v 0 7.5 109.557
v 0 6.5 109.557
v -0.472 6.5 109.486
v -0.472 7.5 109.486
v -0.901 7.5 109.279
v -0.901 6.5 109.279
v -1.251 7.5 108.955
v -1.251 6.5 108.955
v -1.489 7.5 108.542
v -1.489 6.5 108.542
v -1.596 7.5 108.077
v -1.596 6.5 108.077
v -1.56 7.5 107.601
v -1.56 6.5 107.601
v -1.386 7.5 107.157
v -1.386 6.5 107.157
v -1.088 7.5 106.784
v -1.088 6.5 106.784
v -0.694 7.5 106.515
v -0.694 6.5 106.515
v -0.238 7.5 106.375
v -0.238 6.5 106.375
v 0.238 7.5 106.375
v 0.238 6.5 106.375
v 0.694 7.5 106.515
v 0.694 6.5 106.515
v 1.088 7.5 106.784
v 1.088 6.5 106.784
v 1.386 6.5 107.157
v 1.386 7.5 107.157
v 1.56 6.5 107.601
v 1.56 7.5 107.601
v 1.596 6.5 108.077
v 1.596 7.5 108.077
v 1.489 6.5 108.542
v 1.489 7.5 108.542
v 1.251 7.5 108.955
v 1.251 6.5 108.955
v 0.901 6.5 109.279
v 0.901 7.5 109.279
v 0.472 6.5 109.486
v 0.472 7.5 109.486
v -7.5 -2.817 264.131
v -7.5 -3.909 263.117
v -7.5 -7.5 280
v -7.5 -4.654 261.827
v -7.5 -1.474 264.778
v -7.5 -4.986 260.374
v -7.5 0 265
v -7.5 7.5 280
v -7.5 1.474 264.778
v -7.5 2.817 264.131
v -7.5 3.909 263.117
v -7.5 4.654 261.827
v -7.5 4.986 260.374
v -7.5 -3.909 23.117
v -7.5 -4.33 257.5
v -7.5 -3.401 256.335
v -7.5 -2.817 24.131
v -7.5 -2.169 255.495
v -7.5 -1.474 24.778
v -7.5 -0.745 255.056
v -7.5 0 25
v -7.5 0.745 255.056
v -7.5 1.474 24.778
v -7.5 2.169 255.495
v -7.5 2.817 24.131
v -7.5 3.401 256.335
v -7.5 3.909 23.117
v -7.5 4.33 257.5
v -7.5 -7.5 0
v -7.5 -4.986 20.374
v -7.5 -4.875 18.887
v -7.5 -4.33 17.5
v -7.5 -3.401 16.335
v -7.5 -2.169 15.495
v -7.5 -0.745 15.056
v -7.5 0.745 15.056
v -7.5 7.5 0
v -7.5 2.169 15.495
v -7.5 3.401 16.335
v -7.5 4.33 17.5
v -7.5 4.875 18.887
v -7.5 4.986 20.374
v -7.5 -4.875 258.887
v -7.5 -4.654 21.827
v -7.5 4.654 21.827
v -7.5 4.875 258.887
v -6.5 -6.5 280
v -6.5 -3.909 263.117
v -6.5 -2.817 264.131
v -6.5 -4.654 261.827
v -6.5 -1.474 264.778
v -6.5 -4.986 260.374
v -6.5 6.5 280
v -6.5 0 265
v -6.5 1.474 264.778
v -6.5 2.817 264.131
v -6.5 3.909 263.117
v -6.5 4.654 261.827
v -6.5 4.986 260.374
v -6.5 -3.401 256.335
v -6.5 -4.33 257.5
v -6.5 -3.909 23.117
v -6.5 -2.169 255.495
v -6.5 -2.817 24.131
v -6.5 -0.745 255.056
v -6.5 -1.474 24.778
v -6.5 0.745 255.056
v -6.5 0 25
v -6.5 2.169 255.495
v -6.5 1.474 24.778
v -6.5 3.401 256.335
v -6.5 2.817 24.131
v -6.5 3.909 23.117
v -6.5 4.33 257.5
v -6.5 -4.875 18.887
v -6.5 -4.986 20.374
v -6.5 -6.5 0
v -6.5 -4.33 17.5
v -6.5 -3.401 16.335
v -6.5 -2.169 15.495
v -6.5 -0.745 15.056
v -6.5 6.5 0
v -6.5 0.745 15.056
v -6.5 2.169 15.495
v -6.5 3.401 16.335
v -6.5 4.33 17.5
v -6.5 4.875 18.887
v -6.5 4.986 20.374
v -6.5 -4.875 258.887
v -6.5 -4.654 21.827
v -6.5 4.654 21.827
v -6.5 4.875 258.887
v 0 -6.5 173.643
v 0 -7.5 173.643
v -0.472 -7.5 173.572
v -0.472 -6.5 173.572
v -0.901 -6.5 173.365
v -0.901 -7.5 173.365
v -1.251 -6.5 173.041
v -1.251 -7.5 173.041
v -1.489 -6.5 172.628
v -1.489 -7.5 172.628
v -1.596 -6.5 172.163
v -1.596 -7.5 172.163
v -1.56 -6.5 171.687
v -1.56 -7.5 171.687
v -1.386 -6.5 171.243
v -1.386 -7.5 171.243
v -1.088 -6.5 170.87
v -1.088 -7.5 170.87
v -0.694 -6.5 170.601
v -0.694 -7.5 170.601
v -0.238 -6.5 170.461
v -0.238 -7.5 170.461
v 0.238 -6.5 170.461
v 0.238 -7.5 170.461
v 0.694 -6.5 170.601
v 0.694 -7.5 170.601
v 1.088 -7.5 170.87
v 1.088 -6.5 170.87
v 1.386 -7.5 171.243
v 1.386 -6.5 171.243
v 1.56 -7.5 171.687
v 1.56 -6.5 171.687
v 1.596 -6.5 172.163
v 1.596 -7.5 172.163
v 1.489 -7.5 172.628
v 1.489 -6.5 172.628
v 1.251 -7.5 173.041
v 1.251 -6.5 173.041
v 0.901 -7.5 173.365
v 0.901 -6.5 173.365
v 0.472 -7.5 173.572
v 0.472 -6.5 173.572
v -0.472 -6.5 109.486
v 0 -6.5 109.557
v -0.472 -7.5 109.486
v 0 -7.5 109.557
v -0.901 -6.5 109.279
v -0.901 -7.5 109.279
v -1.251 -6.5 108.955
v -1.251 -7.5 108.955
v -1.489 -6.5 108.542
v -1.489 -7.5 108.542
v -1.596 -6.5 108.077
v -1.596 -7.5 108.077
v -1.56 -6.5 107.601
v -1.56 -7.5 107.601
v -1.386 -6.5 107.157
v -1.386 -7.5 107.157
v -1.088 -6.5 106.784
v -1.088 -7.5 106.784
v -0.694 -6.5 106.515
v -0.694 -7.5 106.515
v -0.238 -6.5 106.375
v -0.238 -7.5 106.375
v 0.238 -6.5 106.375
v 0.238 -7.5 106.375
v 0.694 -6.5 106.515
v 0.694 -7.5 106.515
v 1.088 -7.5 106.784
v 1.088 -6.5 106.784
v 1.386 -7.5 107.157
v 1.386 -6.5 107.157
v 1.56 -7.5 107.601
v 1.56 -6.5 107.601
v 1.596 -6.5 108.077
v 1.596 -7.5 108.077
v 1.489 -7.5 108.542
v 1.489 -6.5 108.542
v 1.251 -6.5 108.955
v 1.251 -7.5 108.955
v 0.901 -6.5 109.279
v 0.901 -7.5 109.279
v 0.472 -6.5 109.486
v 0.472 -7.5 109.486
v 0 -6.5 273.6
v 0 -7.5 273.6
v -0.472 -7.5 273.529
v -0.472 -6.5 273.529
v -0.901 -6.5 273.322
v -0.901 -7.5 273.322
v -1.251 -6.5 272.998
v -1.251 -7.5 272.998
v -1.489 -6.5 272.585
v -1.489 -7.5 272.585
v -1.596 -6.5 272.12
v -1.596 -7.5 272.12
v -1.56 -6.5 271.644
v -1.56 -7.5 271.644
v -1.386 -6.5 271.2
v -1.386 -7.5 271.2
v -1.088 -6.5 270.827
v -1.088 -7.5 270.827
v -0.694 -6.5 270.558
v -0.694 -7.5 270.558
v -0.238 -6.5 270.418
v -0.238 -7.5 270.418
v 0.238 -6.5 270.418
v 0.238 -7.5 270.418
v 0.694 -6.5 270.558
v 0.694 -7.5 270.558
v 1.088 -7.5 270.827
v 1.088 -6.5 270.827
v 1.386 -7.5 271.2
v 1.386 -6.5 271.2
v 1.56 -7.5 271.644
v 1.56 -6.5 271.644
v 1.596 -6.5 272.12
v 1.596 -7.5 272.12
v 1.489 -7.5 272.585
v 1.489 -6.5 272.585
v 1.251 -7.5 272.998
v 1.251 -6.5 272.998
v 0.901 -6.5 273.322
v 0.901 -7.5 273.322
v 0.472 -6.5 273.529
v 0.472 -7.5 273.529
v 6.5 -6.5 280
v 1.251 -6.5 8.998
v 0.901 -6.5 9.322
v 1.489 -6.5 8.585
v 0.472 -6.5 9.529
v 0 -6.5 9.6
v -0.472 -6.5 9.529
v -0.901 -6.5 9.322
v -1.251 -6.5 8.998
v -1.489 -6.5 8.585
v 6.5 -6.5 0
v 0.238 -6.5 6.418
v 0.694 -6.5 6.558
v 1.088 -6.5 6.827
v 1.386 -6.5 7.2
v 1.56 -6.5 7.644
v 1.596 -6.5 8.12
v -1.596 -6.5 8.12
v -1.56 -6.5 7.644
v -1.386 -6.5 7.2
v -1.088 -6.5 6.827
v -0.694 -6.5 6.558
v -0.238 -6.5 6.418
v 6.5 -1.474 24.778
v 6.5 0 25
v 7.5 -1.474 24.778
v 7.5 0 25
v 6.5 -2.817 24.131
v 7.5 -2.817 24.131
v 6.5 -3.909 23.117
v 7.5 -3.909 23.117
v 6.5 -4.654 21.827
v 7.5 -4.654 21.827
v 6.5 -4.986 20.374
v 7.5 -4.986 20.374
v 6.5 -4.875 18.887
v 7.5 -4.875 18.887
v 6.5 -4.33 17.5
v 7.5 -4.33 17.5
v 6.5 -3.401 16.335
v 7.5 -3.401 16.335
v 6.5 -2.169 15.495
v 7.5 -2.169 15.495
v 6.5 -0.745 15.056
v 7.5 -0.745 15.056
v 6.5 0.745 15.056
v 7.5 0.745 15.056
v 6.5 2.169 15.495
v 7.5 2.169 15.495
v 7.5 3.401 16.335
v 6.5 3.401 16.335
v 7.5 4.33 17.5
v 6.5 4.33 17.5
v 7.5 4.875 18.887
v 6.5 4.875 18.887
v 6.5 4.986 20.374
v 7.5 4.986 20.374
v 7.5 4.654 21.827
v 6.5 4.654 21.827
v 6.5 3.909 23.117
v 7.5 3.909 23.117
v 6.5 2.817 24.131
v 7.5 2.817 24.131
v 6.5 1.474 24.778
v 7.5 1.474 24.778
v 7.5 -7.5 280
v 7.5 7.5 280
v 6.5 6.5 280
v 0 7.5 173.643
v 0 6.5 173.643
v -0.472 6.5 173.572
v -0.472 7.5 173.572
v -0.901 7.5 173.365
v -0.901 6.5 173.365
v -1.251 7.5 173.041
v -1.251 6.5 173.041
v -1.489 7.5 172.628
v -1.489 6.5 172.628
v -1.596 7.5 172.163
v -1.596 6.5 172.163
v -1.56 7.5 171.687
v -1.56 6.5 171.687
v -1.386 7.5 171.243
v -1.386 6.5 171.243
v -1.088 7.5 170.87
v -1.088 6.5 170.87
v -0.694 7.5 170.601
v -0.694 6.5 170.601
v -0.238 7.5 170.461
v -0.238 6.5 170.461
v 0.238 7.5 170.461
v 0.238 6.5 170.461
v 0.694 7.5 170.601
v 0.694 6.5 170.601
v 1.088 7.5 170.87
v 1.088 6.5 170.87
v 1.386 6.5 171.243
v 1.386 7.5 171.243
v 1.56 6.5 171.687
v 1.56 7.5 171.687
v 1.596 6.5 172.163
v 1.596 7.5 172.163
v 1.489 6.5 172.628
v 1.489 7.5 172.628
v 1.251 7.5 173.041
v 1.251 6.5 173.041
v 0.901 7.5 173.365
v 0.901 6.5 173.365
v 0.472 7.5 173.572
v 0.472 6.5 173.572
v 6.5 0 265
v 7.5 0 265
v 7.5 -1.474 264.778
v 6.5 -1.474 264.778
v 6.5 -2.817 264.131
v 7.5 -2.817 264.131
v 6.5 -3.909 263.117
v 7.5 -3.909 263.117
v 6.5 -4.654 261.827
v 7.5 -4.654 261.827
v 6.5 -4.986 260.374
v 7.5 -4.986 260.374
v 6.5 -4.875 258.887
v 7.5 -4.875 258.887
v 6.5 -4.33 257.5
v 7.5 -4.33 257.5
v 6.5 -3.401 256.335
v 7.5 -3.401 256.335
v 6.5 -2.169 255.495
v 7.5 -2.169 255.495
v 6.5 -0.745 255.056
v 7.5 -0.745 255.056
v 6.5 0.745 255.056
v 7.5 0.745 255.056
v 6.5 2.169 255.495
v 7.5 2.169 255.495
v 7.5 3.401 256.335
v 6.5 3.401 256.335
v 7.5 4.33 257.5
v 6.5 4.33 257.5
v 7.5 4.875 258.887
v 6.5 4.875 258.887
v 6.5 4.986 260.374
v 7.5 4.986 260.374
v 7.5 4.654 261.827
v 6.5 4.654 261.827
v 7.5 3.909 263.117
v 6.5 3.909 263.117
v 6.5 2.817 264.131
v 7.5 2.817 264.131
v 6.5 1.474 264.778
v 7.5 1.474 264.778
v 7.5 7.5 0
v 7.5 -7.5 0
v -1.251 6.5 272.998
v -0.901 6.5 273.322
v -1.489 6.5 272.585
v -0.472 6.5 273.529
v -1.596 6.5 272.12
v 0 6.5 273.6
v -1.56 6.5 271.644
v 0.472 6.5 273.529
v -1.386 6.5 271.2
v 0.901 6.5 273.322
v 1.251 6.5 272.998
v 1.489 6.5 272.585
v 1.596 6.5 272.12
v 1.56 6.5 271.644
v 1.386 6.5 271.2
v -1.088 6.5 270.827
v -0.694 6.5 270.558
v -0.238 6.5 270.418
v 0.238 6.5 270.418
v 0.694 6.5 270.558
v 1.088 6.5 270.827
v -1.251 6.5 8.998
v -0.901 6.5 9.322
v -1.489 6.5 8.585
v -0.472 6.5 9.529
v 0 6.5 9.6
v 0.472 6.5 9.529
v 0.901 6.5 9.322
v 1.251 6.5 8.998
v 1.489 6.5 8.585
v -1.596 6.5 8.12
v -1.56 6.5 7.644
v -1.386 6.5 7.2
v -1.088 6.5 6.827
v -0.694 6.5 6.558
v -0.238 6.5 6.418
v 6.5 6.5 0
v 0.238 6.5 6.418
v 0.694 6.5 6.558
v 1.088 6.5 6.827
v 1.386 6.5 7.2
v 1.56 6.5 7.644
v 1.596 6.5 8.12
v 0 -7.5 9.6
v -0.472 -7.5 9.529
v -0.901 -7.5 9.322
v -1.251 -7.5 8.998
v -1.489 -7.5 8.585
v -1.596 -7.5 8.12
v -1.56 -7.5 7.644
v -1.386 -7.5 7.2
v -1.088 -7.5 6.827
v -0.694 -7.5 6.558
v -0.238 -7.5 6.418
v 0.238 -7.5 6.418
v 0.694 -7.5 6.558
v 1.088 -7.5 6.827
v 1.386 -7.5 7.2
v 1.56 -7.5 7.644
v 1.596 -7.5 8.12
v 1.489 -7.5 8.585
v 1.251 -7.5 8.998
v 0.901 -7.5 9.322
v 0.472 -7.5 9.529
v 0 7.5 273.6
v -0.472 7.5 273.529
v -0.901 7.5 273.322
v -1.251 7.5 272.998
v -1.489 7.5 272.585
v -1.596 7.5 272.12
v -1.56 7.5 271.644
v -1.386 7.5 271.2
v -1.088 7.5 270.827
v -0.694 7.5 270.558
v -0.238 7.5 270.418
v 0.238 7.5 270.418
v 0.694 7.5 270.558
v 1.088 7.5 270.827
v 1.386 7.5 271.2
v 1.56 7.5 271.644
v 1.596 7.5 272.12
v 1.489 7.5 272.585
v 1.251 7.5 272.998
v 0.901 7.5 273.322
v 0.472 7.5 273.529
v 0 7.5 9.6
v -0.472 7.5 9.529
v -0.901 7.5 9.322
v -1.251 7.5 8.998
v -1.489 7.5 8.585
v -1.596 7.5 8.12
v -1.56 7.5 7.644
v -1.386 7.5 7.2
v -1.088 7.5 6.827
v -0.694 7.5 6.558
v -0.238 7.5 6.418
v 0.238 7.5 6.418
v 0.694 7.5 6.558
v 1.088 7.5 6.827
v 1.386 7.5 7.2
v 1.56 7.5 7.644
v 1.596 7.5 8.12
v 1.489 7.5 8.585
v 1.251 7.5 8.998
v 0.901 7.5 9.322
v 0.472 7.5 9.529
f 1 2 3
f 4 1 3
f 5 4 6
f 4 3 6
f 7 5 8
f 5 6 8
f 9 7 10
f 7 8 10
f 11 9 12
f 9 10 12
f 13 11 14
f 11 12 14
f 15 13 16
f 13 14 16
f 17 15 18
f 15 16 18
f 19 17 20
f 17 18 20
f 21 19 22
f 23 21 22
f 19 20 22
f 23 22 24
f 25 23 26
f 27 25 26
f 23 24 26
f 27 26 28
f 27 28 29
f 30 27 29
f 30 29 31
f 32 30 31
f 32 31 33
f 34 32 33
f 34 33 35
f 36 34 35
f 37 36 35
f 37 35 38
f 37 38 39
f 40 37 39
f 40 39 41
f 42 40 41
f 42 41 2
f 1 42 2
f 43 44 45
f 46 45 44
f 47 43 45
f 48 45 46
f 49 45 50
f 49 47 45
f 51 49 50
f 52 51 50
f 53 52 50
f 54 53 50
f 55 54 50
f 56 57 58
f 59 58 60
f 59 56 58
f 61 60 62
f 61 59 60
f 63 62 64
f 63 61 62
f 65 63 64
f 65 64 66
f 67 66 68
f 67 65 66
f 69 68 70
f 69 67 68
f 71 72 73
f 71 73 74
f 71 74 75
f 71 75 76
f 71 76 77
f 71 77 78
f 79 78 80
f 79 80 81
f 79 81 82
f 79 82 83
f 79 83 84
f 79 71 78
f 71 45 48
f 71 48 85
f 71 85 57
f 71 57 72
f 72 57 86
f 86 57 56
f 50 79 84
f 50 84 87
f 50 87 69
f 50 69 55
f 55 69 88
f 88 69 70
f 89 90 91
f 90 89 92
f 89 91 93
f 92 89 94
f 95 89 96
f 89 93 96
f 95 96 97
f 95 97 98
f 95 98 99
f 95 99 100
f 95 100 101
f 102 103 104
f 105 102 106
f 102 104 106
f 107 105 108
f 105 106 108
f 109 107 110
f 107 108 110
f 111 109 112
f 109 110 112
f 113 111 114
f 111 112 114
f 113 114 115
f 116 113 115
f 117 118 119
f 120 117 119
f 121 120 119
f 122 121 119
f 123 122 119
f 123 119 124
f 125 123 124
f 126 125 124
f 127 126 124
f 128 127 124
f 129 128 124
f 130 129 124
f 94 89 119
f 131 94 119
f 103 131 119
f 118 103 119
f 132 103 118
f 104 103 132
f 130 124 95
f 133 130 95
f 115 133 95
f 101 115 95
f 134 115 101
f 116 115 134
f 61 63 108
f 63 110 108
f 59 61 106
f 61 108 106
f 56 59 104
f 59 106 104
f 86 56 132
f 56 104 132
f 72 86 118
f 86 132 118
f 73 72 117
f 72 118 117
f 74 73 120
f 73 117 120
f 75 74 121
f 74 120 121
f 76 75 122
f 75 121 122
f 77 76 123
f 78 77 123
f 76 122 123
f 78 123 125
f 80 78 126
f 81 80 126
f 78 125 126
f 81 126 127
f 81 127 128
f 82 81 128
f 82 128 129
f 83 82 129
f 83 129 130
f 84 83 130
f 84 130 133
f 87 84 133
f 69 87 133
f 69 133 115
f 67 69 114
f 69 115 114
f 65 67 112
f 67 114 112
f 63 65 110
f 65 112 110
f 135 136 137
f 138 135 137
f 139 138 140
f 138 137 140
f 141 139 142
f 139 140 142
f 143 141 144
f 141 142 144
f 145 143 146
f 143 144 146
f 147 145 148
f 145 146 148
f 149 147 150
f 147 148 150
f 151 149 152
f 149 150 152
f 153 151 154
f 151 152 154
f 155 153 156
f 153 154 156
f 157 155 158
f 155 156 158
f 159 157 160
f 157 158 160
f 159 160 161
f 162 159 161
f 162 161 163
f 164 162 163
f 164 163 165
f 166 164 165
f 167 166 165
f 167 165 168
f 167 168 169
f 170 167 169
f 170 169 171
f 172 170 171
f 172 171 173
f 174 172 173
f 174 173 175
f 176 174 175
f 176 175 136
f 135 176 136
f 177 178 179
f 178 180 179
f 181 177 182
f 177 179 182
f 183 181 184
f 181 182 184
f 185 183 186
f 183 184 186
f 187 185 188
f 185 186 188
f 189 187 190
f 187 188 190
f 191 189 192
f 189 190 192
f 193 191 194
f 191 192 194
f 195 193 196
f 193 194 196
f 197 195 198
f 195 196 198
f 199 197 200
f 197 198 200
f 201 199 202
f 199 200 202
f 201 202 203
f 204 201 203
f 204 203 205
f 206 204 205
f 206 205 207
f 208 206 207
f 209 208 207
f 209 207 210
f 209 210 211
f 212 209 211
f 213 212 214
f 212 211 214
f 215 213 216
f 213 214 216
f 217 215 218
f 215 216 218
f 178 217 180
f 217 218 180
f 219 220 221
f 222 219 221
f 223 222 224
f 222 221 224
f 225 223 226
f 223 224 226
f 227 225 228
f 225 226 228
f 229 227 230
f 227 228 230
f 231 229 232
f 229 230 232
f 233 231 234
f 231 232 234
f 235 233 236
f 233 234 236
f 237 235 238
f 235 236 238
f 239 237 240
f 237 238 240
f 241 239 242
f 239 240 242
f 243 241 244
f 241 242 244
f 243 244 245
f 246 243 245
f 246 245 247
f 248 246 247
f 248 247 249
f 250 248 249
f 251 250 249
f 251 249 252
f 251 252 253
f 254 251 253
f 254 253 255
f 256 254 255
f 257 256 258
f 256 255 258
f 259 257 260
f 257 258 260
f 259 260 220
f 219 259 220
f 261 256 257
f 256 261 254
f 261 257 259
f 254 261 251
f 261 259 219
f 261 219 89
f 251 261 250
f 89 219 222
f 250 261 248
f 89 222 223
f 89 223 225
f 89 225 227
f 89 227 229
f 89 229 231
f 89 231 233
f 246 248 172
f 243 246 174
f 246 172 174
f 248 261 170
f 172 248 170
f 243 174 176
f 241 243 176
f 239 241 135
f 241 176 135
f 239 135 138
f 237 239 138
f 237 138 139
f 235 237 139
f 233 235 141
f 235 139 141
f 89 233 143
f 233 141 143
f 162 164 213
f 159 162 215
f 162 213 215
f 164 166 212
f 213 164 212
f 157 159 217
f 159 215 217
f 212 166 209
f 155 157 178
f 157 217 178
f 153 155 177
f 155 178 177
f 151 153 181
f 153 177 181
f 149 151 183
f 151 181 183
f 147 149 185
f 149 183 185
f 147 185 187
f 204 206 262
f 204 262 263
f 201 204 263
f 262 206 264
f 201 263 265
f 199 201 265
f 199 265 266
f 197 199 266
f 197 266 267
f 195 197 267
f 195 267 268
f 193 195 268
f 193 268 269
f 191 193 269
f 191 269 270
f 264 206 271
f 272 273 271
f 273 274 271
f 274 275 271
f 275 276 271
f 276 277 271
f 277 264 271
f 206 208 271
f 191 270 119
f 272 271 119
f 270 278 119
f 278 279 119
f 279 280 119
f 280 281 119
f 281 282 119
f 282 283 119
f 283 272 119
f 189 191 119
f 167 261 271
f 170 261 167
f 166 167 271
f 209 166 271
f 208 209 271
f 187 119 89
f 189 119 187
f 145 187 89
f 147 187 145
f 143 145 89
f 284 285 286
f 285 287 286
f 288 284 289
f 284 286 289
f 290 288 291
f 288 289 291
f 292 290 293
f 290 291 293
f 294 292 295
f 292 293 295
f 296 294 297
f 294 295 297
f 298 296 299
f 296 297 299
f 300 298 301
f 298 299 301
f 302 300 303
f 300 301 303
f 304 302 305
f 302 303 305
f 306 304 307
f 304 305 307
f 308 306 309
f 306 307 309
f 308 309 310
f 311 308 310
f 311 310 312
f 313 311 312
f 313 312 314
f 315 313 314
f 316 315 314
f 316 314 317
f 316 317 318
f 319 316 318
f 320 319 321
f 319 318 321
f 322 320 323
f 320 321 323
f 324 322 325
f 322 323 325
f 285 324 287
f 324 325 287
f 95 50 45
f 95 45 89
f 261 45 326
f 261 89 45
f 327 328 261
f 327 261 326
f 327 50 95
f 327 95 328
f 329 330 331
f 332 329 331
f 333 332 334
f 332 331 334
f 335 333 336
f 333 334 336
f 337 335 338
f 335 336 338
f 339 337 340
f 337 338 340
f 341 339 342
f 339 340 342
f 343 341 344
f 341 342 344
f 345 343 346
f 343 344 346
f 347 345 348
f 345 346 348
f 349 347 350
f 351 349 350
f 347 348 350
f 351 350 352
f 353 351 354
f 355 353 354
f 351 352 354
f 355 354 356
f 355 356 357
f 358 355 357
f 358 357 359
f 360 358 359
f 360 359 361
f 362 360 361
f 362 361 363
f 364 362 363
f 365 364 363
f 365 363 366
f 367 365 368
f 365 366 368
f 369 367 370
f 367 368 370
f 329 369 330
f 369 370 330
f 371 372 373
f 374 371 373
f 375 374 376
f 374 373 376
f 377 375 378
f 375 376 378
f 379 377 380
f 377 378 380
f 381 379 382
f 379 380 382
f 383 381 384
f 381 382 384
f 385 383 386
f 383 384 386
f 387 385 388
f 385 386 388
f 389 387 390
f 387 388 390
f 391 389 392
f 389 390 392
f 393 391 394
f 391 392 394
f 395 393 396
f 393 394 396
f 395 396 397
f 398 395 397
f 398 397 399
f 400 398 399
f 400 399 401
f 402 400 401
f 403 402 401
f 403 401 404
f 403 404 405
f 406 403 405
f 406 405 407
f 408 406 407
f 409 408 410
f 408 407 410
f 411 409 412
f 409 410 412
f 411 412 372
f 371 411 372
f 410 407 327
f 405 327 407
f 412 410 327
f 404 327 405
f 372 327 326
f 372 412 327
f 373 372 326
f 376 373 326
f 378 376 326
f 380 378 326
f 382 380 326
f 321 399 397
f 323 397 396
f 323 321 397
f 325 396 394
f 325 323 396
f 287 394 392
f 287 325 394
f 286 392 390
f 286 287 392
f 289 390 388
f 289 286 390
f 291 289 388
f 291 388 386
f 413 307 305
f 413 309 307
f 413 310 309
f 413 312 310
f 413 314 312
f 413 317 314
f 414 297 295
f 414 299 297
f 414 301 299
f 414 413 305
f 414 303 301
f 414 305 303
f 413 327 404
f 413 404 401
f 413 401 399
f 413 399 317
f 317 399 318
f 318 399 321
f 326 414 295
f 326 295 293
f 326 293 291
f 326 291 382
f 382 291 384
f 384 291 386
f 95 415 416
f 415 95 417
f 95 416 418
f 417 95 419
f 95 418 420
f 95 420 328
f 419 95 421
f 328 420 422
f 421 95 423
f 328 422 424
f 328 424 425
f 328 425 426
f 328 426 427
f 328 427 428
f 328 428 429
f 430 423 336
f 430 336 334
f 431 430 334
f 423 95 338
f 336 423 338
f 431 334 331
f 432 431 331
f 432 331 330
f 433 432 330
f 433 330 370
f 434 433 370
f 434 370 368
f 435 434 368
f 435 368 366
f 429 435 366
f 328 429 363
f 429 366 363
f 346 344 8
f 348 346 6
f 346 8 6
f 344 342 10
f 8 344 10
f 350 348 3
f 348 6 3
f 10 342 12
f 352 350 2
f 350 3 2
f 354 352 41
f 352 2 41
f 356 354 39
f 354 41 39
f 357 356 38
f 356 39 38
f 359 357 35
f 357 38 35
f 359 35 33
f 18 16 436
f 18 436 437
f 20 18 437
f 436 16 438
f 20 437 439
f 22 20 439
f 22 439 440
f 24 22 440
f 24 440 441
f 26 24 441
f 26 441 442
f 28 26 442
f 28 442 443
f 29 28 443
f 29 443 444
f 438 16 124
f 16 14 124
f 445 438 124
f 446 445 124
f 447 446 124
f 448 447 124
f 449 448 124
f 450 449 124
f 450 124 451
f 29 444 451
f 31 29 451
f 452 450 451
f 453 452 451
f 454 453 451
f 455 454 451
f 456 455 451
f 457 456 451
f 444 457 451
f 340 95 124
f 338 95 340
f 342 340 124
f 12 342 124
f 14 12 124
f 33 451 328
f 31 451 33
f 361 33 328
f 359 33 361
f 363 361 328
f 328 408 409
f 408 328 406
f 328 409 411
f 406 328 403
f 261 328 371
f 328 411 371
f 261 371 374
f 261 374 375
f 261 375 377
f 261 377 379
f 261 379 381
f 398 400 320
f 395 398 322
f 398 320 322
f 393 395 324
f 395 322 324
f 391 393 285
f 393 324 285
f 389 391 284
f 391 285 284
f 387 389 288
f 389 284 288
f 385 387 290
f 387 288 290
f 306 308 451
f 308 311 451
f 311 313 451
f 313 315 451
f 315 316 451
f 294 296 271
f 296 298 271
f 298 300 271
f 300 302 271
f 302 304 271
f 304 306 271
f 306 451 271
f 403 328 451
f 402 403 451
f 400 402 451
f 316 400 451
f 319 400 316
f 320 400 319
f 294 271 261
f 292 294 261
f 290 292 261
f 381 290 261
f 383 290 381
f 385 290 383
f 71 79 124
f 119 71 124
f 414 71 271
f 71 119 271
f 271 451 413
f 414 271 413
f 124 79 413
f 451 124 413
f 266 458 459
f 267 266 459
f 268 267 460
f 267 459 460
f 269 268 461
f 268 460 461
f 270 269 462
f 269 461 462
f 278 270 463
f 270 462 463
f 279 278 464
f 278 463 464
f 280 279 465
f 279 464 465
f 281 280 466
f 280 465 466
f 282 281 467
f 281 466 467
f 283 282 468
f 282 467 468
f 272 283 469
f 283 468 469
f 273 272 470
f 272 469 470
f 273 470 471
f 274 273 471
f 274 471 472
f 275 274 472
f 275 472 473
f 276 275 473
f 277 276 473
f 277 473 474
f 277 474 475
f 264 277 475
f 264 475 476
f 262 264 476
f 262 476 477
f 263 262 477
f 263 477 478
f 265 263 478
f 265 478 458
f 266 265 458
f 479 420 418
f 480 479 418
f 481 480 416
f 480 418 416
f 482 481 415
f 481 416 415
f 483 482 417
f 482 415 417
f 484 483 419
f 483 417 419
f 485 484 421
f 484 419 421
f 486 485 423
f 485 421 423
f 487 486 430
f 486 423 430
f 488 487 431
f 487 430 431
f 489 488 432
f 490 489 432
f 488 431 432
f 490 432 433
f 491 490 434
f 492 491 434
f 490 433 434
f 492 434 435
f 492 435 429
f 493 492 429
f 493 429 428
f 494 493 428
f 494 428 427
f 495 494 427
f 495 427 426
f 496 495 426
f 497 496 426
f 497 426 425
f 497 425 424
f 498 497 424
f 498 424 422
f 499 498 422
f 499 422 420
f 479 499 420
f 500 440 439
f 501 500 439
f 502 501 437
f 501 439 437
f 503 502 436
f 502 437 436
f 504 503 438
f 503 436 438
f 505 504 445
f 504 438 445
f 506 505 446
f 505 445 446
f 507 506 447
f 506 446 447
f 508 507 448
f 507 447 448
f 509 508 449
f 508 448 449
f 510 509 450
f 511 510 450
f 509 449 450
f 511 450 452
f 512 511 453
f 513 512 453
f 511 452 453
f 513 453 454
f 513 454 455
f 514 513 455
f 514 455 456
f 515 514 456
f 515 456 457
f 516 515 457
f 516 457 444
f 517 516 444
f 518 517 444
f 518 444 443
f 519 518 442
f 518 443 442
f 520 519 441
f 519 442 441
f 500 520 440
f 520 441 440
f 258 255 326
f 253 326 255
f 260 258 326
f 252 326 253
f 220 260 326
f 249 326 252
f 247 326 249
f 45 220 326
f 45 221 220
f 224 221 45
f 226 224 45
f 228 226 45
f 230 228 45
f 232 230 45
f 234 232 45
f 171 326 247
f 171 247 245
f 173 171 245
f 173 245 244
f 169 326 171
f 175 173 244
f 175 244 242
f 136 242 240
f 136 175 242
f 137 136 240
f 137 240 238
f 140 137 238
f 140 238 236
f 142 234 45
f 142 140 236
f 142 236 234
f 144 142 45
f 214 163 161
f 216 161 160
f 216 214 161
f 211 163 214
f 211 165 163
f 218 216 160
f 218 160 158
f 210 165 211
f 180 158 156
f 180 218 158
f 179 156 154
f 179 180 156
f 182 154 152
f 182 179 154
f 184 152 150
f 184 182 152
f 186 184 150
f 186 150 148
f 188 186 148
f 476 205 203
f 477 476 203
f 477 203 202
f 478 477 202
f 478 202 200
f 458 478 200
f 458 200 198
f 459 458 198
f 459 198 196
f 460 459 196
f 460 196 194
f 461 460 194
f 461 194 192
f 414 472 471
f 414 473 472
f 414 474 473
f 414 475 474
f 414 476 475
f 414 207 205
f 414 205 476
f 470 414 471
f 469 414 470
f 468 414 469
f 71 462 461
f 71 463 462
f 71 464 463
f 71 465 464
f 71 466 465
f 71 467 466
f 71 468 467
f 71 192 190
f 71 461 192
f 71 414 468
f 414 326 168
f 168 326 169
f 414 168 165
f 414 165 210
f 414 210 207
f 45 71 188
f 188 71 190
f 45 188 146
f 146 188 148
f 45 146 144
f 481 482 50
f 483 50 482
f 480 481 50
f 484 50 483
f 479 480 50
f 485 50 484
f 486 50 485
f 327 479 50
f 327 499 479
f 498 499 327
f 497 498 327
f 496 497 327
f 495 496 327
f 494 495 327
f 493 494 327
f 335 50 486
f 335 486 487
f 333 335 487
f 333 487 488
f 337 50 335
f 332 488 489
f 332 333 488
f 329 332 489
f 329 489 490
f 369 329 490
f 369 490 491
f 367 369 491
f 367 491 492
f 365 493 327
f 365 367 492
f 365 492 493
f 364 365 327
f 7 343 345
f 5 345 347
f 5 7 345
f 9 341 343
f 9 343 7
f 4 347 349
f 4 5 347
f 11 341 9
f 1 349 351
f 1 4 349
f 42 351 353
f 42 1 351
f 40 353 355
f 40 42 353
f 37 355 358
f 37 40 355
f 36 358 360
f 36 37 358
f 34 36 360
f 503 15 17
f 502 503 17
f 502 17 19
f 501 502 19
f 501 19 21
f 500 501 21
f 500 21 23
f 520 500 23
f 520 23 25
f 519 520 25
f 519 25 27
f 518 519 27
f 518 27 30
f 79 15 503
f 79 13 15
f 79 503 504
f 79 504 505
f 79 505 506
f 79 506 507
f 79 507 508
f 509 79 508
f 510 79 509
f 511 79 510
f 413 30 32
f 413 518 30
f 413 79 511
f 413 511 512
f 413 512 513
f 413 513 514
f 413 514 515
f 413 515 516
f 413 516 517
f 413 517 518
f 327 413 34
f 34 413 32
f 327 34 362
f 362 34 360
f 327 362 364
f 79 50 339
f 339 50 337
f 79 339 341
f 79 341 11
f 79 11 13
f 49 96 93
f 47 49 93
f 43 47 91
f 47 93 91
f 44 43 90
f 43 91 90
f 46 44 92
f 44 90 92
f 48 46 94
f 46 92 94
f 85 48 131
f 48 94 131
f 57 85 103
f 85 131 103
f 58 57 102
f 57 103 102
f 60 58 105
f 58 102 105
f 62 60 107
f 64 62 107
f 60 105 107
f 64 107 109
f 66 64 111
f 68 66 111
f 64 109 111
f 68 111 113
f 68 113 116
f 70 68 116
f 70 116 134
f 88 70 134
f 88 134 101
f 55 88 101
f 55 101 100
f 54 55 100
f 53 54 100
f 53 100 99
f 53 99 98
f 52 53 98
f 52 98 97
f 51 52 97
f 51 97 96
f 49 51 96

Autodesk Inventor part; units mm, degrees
ref_plane "YZ Plane" through (0, 0, 0) normal (1, 0, 0) x (0, 1, 0)
ref_plane "XZ Plane" through (0, 0, 0) normal (0, 1, 0) x (-1, 0, 0)
ref_plane "XY Plane" through (0, 0, 0) normal (0, 0, 1) x (1, 0, 0)
sketch "スケッチ1" plane through (0, 0, 0) normal (0, 0, 1) x (1, 0, 0)
  line L0 (7.5, -7.5) -> (-7.5, -7.5)
  line L1 (-7.5, -7.5) -> (-7.5, 7.5)
  line L2 (-7.5, 7.5) -> (7.5, 7.5)
  line L3 (7.5, 7.5) -> (7.5, -7.5)
  line L4 (7.5, -7.5) -> (-7.5, 7.5) construction
  line L5 (-7.5, -7.5) -> (7.5, 7.5) construction
  point P0 (0, 0)
  dimension "d0" = 15
  dimension "d1" = 15
extrude "押し出し1" add sketch "スケッチ1" along normal blind 280
shell "シェル1" thickness 1 removed faces 2 at (2.5, -2.5, 0) at (2.5, -2.5, 280)
sketch "スケッチ2" plane through (-7.5, 7.5, 0) normal (0, 1, 0) x (1, 0, 0)
  line L0 (7.5, -172.043) -> (7.5, -107.957) construction
  line L1 (15, -280) -> (0, -280) projected
  line L2 (0, 0) -> (0, -280) projected
  line L3 (0, -140) -> (7.5, -140) construction
  point P0 (7.5, 0)
  point P1 (7.5, -280)
  point P2 (7.5, -272)
  point P3 (7.5, -8)
  dimension "d5" = 64.086
  dimension "d29" = 264
hole "穴1" at (0, 7.5, 172.043) at (0, 7.5, 107.957) at (0, 7.5, 272) at (0, 7.5, 8) direction (0, -1, 0) diameter 3.2 end through all
sketch "スケッチ3" plane through (-7.5, -7.5, 0) normal (-1, 0, 0) x (0, 0, 1)
  line L0 (20, 7.5) -> (260, 7.5)
  line L1 (0, 15) -> (280, 15) projected
  line L2 (280, 15) -> (280, 0) projected
  point P0 (0, 7.5)
  point P1 (140, 7.5)
  point P2 (140, 15)
  point P3 (280, 7.5)
  dimension "d13" = 240
hole "穴2" at (-7.5, 0, 260) at (-7.5, 0, 20) direction (1, 0, 0) diameter 10 end through all
properties part number "BaseSlideSTOPPERsq2"
